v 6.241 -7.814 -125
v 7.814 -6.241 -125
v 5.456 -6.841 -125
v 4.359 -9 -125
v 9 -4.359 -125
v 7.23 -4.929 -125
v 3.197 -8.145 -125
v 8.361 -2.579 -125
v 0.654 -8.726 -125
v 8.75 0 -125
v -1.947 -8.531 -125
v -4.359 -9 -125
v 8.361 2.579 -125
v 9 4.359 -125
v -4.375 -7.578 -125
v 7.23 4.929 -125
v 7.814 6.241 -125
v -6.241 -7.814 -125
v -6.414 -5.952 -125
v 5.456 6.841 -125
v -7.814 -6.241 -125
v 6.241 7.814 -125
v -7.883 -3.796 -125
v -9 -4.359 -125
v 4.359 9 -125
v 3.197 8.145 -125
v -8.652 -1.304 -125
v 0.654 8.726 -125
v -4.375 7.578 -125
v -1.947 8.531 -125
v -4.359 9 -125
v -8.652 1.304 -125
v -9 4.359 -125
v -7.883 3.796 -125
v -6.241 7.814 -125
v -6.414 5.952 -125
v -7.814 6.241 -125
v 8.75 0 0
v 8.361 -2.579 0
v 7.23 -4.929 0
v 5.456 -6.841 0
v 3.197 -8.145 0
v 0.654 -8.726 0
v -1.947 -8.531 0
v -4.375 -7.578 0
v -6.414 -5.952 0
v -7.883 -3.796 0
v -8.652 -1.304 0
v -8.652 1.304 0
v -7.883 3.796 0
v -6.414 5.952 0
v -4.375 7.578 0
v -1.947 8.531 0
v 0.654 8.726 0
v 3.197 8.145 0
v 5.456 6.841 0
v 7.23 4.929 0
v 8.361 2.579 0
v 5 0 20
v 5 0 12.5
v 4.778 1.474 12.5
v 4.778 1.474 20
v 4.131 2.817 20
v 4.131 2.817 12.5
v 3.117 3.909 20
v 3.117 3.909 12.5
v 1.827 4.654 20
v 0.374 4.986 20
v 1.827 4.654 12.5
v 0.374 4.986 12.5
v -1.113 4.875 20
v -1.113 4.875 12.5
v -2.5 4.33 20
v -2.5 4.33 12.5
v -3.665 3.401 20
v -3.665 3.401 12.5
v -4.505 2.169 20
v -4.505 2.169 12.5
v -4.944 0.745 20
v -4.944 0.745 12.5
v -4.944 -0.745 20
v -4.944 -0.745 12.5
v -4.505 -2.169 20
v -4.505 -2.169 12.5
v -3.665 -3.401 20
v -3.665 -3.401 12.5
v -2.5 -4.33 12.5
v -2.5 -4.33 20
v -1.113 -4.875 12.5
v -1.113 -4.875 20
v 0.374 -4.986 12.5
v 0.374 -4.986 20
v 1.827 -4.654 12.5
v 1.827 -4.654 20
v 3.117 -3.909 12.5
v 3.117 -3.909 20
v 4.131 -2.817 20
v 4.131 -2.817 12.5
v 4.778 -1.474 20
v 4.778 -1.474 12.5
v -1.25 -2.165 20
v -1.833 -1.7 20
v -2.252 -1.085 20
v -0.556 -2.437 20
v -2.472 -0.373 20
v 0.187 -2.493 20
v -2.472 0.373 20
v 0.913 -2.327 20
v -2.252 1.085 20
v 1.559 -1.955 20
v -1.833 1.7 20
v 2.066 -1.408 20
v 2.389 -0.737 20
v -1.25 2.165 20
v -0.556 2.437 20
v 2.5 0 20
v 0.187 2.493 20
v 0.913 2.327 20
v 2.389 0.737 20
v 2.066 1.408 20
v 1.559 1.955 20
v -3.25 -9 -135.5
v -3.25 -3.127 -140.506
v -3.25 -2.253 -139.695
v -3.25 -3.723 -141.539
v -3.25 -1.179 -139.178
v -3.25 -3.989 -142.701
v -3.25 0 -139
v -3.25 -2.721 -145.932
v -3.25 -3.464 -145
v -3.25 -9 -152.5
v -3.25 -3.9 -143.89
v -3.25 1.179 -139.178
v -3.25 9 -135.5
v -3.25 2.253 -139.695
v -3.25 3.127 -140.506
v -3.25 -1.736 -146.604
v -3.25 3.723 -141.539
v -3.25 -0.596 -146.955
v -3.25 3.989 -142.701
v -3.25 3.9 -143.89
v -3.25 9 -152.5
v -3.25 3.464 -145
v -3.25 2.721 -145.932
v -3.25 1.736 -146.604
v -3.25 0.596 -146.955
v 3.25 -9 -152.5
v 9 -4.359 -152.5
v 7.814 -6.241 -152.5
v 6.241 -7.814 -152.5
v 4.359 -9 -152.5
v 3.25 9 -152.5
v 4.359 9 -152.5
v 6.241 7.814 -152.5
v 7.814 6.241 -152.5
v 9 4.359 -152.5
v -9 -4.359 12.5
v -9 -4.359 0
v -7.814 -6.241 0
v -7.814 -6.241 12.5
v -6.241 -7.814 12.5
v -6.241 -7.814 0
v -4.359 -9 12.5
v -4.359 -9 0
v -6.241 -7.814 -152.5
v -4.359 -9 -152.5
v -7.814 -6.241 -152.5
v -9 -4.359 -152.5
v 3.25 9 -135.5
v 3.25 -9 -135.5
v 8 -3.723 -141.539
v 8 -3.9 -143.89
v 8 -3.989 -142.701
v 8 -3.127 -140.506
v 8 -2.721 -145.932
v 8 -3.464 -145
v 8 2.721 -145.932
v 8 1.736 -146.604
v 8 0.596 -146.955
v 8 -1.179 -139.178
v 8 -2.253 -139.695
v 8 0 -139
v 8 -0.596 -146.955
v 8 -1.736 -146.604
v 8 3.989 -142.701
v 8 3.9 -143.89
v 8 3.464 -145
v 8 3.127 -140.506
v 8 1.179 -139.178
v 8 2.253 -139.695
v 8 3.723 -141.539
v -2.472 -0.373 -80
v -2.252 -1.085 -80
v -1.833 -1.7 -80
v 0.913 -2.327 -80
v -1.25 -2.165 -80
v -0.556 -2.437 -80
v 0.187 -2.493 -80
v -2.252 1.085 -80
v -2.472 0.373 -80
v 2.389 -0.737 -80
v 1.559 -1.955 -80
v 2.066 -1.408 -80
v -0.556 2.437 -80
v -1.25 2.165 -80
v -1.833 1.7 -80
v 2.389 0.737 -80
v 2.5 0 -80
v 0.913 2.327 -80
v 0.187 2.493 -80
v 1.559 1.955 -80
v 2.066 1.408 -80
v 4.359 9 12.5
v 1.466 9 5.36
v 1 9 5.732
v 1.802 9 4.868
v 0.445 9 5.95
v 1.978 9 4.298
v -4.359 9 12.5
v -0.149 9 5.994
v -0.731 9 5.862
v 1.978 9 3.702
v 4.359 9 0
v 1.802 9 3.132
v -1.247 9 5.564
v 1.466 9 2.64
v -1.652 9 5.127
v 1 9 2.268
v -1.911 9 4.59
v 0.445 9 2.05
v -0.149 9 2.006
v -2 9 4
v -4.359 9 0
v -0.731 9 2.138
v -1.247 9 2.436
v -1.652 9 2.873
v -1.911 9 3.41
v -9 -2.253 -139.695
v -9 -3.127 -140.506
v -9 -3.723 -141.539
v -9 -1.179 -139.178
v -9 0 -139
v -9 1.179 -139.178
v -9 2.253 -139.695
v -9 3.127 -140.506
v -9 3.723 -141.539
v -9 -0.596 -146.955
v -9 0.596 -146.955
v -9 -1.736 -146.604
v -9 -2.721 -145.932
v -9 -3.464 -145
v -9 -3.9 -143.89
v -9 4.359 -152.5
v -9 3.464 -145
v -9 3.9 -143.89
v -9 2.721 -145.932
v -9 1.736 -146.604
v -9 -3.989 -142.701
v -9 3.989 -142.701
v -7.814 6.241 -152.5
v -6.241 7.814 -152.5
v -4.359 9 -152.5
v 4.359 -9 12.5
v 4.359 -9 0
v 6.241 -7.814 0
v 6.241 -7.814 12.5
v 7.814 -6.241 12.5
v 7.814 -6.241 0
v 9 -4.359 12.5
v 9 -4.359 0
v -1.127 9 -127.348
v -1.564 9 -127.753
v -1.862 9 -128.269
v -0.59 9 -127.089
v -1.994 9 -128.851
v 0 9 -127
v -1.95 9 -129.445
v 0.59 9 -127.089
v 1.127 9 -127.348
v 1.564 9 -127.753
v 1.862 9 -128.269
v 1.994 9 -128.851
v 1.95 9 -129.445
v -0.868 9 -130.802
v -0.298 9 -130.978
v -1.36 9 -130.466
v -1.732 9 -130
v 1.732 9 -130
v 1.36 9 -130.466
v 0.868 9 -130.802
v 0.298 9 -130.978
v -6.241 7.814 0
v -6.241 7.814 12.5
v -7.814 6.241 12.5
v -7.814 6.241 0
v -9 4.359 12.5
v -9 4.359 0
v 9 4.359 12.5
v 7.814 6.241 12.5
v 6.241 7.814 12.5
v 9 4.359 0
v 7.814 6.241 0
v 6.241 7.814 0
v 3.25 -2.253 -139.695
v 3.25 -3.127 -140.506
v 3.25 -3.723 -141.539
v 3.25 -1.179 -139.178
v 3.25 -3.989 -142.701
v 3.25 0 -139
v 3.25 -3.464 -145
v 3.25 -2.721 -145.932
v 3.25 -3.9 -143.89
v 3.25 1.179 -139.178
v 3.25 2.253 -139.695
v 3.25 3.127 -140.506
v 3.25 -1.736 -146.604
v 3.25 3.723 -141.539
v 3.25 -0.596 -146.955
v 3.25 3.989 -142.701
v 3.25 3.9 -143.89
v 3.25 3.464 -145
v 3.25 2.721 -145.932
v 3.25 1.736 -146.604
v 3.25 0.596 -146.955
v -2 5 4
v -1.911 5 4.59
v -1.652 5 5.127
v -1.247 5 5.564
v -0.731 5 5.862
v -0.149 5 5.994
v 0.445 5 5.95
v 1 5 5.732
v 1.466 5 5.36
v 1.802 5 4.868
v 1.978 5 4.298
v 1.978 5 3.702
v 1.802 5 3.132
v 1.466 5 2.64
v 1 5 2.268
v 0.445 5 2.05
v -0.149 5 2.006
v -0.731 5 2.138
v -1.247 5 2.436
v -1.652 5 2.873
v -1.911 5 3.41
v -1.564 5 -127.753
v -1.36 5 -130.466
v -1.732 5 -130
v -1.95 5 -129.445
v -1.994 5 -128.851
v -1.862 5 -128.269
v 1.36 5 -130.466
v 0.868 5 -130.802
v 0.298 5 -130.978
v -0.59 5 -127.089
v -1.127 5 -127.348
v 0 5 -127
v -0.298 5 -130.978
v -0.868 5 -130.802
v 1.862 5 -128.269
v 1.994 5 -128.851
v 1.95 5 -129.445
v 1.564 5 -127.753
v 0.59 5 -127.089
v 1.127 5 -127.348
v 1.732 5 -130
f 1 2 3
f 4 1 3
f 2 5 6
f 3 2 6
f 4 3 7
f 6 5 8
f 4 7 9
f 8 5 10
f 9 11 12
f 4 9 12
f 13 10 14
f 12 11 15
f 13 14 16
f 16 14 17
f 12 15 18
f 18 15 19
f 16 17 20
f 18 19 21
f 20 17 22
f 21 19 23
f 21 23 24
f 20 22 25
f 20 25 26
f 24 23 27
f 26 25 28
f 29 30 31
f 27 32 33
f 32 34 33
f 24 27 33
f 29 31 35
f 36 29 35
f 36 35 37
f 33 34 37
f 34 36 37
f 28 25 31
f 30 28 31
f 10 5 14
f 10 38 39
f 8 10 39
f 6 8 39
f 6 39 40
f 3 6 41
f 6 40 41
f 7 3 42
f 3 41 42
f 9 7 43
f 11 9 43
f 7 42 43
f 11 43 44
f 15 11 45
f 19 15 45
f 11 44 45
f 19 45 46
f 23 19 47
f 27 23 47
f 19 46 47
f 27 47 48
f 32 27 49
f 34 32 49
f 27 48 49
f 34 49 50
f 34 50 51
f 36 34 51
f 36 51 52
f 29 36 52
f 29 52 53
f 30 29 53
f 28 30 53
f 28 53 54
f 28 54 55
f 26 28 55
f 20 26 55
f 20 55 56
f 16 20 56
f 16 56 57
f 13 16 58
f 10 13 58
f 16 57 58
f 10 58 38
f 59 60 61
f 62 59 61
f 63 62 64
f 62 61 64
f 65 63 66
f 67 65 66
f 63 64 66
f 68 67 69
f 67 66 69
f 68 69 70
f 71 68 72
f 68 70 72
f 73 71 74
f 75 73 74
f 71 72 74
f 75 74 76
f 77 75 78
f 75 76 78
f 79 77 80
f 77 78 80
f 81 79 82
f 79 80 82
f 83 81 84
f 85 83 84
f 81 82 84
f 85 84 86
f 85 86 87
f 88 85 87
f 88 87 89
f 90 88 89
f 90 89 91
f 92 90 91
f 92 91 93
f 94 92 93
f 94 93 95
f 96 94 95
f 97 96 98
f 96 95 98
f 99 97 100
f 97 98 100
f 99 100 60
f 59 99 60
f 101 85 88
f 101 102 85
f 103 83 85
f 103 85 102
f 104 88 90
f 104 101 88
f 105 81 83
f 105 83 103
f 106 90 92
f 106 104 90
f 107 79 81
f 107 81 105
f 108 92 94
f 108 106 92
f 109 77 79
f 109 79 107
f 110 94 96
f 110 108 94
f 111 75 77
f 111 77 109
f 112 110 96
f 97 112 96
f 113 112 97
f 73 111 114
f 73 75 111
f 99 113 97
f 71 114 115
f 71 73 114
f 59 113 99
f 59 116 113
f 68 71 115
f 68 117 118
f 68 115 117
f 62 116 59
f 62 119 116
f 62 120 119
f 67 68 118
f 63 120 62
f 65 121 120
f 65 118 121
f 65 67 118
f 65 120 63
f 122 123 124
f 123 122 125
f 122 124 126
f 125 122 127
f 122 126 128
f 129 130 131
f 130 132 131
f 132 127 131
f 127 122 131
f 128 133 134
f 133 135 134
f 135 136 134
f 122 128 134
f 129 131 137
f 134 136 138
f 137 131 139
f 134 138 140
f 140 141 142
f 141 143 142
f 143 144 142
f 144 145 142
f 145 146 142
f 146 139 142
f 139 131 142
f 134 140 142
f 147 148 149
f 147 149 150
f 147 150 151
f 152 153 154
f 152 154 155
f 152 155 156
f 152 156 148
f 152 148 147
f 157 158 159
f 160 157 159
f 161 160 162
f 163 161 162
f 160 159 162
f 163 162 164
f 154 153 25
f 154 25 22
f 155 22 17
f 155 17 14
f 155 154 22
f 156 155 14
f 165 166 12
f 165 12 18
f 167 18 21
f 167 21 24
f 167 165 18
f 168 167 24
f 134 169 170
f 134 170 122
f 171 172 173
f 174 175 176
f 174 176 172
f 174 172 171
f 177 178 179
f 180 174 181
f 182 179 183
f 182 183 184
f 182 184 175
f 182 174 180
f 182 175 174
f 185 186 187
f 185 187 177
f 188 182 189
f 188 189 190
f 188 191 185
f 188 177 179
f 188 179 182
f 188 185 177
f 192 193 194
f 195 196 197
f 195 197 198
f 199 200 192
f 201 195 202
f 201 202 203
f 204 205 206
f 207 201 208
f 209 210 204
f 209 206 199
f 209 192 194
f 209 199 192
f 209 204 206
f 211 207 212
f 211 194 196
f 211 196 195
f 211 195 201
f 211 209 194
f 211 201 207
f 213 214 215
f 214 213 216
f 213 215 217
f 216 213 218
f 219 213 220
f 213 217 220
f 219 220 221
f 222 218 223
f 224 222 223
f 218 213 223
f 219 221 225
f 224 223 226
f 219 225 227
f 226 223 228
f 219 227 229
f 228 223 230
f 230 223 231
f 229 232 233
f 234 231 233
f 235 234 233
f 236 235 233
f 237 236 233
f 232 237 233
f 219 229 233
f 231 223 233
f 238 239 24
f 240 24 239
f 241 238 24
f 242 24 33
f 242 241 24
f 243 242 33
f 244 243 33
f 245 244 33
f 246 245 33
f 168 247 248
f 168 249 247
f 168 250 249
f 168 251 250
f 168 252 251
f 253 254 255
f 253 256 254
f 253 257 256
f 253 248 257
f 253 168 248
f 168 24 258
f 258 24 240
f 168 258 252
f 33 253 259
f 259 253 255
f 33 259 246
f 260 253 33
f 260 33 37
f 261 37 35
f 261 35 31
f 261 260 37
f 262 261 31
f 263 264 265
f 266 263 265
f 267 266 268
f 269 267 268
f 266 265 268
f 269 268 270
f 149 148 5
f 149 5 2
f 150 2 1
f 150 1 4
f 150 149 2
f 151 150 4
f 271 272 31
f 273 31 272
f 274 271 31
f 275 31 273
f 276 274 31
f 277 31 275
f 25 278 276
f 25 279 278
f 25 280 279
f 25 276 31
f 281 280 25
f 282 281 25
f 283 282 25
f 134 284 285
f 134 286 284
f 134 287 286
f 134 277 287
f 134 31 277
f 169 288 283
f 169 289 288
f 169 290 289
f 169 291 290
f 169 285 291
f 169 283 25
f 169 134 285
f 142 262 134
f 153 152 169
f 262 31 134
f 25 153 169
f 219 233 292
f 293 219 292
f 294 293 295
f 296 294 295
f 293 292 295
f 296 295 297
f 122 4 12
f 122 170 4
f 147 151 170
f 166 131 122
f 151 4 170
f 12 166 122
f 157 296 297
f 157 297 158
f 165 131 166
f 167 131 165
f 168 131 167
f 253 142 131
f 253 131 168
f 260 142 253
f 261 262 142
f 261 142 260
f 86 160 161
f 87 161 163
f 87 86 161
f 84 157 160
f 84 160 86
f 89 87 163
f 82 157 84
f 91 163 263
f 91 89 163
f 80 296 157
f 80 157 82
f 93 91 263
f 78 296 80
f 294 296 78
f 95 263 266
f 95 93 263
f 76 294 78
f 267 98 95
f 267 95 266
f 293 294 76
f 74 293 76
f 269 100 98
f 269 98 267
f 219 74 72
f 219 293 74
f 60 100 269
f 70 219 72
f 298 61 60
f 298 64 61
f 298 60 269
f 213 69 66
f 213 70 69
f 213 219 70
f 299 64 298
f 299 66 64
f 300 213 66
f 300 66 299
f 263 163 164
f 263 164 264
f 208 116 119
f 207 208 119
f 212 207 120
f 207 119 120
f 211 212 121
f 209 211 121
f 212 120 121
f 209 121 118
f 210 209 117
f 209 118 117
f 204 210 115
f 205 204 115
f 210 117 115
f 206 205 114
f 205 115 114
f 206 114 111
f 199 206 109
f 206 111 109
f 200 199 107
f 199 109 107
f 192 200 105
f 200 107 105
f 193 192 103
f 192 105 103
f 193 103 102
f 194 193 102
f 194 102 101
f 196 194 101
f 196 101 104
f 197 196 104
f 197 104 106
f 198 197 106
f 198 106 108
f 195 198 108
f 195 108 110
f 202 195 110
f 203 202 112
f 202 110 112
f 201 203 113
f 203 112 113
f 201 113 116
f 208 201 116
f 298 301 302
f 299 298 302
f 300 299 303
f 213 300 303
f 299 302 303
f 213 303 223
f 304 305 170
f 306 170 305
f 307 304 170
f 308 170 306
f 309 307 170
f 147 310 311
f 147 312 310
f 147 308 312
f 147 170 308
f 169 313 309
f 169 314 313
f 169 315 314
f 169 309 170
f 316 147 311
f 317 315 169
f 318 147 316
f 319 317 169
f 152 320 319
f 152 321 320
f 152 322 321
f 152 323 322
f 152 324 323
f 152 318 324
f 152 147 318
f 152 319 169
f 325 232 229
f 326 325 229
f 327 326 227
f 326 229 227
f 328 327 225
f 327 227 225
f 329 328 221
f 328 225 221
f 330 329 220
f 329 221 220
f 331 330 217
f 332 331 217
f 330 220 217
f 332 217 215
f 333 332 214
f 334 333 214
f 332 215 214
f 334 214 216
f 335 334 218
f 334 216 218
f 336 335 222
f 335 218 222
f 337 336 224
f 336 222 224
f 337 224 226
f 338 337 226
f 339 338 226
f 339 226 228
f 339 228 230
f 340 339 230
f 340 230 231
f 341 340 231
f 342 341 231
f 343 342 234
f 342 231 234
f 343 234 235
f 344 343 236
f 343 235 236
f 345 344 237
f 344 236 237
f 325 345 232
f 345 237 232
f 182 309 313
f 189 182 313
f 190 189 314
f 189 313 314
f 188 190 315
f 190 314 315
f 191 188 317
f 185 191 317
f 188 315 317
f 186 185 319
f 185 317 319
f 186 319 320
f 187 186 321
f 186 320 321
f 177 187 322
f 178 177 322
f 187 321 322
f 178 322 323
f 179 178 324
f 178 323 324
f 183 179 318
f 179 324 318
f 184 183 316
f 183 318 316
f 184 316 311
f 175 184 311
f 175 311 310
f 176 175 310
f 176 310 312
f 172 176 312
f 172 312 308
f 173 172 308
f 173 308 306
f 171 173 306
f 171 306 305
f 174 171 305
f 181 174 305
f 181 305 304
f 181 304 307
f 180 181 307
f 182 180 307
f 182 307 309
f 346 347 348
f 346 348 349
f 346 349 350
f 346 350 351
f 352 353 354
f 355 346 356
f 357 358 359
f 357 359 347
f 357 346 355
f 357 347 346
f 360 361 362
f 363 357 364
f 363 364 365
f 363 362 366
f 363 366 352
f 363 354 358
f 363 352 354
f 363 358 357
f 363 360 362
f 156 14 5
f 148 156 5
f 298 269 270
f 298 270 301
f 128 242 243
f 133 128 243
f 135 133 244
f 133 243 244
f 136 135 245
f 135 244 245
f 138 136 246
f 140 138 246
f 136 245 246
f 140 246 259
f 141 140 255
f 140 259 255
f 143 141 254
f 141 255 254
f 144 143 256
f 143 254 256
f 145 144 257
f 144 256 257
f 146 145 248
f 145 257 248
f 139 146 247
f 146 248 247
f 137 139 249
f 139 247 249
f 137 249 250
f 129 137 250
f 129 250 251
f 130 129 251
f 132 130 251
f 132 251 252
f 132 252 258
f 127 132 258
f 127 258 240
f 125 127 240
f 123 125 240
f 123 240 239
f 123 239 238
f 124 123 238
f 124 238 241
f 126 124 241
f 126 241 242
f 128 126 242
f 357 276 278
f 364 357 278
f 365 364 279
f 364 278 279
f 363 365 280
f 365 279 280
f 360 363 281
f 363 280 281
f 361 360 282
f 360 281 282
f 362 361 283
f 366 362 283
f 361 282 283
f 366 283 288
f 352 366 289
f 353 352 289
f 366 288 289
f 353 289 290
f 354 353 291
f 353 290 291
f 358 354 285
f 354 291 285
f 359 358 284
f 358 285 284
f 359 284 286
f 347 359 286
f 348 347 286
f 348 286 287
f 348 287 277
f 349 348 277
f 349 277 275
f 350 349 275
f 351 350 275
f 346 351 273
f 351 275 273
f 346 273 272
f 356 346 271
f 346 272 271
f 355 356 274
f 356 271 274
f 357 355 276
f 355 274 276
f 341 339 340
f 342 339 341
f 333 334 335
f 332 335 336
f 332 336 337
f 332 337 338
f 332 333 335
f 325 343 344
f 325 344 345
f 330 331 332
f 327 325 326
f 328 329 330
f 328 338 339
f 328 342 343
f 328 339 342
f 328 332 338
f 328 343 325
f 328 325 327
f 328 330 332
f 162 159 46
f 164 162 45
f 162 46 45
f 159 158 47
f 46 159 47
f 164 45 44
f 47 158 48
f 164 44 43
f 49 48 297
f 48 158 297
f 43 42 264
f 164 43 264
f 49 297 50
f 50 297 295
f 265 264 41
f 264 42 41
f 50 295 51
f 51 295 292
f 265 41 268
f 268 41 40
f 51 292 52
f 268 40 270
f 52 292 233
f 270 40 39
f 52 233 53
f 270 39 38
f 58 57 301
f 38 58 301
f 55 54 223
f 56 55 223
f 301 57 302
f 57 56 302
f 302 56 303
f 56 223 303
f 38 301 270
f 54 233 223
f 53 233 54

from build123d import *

# Parameters (mm, degrees)
BOSS_EXTRUDE1_DEPTH = 12.5
SKETCH2_R           = 5
BOSS_EXTRUDE2_DEPTH = 7.5
SKETCH3_R           = 8.75
BOSS_EXTRUDE3_DEPTH = 125
BOSS_EXTRUDE4_START = 27.5
BOSS_EXTRUDE4_DEPTH = 27.5
SKETCH7_W           = 6.5
SKETCH7_H           = 18
CUT_EXTRUDE1_DEPTH  = 17
SKETCH8_R           = 4
CUT_EXTRUDE2_DEPTH  = 17
SKETCH9_R           = 2
CUT_EXTRUDE3_DEPTH  = 4
SKETCH10_R          = 2
CUT_EXTRUDE4_DEPTH  = 4
SKETCH11_R          = 2.5
CUT_EXTRUDE5_DEPTH  = 100


with BuildPart() as part:
    # Sketch1 → Boss-Extrude1 (new body)
    with BuildSketch(Plane.XY):
        with BuildLine():
            ThreePointArc((-9, -4.358898944), (-7.071067812, -7.071067812), (-4.358898944, -9))
            Line((-4.358898944, -9), (4.358898944, -9))
            ThreePointArc((4.358898944, -9), (7.071067812, -7.071067812), (9, -4.358898944))
            Line((9, -4.358898944), (9, 4.358898944))
            ThreePointArc((9, 4.358898944), (7.071067812, 7.071067812), (4.358898944, 9))
            Line((4.358898944, 9), (-4.358898944, 9))
            ThreePointArc((-4.358898944, 9), (-7.071067812, 7.071067812), (-9, 4.358898944))
            Line((-9, 4.358898944), (-9, -4.358898944))
        make_face()
    extrude(amount=BOSS_EXTRUDE1_DEPTH)

    # Sketch2 → Boss-Extrude2 (add)
    with BuildSketch(Plane.XY.offset(12.5)):
        Circle(SKETCH2_R)
    extrude(amount=BOSS_EXTRUDE2_DEPTH)

    # Sketch3 → Boss-Extrude3 (add)
    with BuildSketch(Plane(origin=(0, 0, 0), x_dir=(-1, 0, 0), z_dir=(0, 0, -1))):
        with Locations(Location((0, 0, 0), (0, 0, 180))):
            Circle(SKETCH3_R)
    extrude(amount=BOSS_EXTRUDE3_DEPTH)

    # Sketch6 → Boss-Extrude4 (add)
    with BuildSketch(Plane(origin=(0, 0, -125), x_dir=(-1, 0, 0), z_dir=(0, 0, -1)).offset(BOSS_EXTRUDE4_START)):
        with BuildLine():
            Line((-4.358898944, -9), (4.358898944, -9))
            ThreePointArc((4.358898944, -9), (7.071067812, -7.071067812), (9, -4.358898944))
            Line((9, -4.358898944), (9, 4.358898944))
            ThreePointArc((9, 4.358898944), (7.071067812, 7.071067812), (4.358898944, 9))
            Line((4.358898944, 9), (-4.358898944, 9))
            ThreePointArc((-4.358898944, 9), (-7.071067812, 7.071067812), (-9, 4.358898944))
            Line((-9, 4.358898944), (-9, -4.358898944))
            ThreePointArc((-9, -4.358898944), (-7.071067812, -7.071067812), (-4.358898944, -9))
        make_face()
    extrude(amount=-BOSS_EXTRUDE4_DEPTH)

    # Sketch7 → Cut-Extrude1 (cut)
    with BuildSketch(Plane(origin=(0, 0, -152.5), x_dir=(-1, 0, 0), z_dir=(0, 0, -1))):
        Rectangle(SKETCH7_W, SKETCH7_H)
    extrude(amount=-CUT_EXTRUDE1_DEPTH, mode=Mode.SUBTRACT)

    # Sketch8 → Cut-Extrude2 (cut)
    with BuildSketch(Plane.ZY.offset(9)):
        with Locations((-143, 0)):
            Circle(SKETCH8_R)
    extrude(amount=-CUT_EXTRUDE2_DEPTH, mode=Mode.SUBTRACT)

    # Sketch9 → Cut-Extrude3 (cut)
    with BuildSketch(Plane(origin=(0, 9, 0), x_dir=(1, 0, 0), z_dir=(0, 1, 0))):
        with Locations(Location((0, 129, 0), (0, 0, 270))):
            Circle(SKETCH9_R)
    extrude(amount=-CUT_EXTRUDE3_DEPTH, mode=Mode.SUBTRACT)

    # Sketch10 → Cut-Extrude4 (cut)
    with BuildSketch(Plane(origin=(0, 9, 0), x_dir=(1, 0, 0), z_dir=(0, 1, 0))):
        with Locations(Location((0, -4, 0), (0, 0, 180))):
            Circle(SKETCH10_R)
    extrude(amount=-CUT_EXTRUDE4_DEPTH, mode=Mode.SUBTRACT)

    # Sketch11 → Cut-Extrude5 (cut)
    with BuildSketch(Plane.XY.offset(20)):
        Circle(SKETCH11_R)
    extrude(amount=-CUT_EXTRUDE5_DEPTH, mode=Mode.SUBTRACT)


solid = part.part
